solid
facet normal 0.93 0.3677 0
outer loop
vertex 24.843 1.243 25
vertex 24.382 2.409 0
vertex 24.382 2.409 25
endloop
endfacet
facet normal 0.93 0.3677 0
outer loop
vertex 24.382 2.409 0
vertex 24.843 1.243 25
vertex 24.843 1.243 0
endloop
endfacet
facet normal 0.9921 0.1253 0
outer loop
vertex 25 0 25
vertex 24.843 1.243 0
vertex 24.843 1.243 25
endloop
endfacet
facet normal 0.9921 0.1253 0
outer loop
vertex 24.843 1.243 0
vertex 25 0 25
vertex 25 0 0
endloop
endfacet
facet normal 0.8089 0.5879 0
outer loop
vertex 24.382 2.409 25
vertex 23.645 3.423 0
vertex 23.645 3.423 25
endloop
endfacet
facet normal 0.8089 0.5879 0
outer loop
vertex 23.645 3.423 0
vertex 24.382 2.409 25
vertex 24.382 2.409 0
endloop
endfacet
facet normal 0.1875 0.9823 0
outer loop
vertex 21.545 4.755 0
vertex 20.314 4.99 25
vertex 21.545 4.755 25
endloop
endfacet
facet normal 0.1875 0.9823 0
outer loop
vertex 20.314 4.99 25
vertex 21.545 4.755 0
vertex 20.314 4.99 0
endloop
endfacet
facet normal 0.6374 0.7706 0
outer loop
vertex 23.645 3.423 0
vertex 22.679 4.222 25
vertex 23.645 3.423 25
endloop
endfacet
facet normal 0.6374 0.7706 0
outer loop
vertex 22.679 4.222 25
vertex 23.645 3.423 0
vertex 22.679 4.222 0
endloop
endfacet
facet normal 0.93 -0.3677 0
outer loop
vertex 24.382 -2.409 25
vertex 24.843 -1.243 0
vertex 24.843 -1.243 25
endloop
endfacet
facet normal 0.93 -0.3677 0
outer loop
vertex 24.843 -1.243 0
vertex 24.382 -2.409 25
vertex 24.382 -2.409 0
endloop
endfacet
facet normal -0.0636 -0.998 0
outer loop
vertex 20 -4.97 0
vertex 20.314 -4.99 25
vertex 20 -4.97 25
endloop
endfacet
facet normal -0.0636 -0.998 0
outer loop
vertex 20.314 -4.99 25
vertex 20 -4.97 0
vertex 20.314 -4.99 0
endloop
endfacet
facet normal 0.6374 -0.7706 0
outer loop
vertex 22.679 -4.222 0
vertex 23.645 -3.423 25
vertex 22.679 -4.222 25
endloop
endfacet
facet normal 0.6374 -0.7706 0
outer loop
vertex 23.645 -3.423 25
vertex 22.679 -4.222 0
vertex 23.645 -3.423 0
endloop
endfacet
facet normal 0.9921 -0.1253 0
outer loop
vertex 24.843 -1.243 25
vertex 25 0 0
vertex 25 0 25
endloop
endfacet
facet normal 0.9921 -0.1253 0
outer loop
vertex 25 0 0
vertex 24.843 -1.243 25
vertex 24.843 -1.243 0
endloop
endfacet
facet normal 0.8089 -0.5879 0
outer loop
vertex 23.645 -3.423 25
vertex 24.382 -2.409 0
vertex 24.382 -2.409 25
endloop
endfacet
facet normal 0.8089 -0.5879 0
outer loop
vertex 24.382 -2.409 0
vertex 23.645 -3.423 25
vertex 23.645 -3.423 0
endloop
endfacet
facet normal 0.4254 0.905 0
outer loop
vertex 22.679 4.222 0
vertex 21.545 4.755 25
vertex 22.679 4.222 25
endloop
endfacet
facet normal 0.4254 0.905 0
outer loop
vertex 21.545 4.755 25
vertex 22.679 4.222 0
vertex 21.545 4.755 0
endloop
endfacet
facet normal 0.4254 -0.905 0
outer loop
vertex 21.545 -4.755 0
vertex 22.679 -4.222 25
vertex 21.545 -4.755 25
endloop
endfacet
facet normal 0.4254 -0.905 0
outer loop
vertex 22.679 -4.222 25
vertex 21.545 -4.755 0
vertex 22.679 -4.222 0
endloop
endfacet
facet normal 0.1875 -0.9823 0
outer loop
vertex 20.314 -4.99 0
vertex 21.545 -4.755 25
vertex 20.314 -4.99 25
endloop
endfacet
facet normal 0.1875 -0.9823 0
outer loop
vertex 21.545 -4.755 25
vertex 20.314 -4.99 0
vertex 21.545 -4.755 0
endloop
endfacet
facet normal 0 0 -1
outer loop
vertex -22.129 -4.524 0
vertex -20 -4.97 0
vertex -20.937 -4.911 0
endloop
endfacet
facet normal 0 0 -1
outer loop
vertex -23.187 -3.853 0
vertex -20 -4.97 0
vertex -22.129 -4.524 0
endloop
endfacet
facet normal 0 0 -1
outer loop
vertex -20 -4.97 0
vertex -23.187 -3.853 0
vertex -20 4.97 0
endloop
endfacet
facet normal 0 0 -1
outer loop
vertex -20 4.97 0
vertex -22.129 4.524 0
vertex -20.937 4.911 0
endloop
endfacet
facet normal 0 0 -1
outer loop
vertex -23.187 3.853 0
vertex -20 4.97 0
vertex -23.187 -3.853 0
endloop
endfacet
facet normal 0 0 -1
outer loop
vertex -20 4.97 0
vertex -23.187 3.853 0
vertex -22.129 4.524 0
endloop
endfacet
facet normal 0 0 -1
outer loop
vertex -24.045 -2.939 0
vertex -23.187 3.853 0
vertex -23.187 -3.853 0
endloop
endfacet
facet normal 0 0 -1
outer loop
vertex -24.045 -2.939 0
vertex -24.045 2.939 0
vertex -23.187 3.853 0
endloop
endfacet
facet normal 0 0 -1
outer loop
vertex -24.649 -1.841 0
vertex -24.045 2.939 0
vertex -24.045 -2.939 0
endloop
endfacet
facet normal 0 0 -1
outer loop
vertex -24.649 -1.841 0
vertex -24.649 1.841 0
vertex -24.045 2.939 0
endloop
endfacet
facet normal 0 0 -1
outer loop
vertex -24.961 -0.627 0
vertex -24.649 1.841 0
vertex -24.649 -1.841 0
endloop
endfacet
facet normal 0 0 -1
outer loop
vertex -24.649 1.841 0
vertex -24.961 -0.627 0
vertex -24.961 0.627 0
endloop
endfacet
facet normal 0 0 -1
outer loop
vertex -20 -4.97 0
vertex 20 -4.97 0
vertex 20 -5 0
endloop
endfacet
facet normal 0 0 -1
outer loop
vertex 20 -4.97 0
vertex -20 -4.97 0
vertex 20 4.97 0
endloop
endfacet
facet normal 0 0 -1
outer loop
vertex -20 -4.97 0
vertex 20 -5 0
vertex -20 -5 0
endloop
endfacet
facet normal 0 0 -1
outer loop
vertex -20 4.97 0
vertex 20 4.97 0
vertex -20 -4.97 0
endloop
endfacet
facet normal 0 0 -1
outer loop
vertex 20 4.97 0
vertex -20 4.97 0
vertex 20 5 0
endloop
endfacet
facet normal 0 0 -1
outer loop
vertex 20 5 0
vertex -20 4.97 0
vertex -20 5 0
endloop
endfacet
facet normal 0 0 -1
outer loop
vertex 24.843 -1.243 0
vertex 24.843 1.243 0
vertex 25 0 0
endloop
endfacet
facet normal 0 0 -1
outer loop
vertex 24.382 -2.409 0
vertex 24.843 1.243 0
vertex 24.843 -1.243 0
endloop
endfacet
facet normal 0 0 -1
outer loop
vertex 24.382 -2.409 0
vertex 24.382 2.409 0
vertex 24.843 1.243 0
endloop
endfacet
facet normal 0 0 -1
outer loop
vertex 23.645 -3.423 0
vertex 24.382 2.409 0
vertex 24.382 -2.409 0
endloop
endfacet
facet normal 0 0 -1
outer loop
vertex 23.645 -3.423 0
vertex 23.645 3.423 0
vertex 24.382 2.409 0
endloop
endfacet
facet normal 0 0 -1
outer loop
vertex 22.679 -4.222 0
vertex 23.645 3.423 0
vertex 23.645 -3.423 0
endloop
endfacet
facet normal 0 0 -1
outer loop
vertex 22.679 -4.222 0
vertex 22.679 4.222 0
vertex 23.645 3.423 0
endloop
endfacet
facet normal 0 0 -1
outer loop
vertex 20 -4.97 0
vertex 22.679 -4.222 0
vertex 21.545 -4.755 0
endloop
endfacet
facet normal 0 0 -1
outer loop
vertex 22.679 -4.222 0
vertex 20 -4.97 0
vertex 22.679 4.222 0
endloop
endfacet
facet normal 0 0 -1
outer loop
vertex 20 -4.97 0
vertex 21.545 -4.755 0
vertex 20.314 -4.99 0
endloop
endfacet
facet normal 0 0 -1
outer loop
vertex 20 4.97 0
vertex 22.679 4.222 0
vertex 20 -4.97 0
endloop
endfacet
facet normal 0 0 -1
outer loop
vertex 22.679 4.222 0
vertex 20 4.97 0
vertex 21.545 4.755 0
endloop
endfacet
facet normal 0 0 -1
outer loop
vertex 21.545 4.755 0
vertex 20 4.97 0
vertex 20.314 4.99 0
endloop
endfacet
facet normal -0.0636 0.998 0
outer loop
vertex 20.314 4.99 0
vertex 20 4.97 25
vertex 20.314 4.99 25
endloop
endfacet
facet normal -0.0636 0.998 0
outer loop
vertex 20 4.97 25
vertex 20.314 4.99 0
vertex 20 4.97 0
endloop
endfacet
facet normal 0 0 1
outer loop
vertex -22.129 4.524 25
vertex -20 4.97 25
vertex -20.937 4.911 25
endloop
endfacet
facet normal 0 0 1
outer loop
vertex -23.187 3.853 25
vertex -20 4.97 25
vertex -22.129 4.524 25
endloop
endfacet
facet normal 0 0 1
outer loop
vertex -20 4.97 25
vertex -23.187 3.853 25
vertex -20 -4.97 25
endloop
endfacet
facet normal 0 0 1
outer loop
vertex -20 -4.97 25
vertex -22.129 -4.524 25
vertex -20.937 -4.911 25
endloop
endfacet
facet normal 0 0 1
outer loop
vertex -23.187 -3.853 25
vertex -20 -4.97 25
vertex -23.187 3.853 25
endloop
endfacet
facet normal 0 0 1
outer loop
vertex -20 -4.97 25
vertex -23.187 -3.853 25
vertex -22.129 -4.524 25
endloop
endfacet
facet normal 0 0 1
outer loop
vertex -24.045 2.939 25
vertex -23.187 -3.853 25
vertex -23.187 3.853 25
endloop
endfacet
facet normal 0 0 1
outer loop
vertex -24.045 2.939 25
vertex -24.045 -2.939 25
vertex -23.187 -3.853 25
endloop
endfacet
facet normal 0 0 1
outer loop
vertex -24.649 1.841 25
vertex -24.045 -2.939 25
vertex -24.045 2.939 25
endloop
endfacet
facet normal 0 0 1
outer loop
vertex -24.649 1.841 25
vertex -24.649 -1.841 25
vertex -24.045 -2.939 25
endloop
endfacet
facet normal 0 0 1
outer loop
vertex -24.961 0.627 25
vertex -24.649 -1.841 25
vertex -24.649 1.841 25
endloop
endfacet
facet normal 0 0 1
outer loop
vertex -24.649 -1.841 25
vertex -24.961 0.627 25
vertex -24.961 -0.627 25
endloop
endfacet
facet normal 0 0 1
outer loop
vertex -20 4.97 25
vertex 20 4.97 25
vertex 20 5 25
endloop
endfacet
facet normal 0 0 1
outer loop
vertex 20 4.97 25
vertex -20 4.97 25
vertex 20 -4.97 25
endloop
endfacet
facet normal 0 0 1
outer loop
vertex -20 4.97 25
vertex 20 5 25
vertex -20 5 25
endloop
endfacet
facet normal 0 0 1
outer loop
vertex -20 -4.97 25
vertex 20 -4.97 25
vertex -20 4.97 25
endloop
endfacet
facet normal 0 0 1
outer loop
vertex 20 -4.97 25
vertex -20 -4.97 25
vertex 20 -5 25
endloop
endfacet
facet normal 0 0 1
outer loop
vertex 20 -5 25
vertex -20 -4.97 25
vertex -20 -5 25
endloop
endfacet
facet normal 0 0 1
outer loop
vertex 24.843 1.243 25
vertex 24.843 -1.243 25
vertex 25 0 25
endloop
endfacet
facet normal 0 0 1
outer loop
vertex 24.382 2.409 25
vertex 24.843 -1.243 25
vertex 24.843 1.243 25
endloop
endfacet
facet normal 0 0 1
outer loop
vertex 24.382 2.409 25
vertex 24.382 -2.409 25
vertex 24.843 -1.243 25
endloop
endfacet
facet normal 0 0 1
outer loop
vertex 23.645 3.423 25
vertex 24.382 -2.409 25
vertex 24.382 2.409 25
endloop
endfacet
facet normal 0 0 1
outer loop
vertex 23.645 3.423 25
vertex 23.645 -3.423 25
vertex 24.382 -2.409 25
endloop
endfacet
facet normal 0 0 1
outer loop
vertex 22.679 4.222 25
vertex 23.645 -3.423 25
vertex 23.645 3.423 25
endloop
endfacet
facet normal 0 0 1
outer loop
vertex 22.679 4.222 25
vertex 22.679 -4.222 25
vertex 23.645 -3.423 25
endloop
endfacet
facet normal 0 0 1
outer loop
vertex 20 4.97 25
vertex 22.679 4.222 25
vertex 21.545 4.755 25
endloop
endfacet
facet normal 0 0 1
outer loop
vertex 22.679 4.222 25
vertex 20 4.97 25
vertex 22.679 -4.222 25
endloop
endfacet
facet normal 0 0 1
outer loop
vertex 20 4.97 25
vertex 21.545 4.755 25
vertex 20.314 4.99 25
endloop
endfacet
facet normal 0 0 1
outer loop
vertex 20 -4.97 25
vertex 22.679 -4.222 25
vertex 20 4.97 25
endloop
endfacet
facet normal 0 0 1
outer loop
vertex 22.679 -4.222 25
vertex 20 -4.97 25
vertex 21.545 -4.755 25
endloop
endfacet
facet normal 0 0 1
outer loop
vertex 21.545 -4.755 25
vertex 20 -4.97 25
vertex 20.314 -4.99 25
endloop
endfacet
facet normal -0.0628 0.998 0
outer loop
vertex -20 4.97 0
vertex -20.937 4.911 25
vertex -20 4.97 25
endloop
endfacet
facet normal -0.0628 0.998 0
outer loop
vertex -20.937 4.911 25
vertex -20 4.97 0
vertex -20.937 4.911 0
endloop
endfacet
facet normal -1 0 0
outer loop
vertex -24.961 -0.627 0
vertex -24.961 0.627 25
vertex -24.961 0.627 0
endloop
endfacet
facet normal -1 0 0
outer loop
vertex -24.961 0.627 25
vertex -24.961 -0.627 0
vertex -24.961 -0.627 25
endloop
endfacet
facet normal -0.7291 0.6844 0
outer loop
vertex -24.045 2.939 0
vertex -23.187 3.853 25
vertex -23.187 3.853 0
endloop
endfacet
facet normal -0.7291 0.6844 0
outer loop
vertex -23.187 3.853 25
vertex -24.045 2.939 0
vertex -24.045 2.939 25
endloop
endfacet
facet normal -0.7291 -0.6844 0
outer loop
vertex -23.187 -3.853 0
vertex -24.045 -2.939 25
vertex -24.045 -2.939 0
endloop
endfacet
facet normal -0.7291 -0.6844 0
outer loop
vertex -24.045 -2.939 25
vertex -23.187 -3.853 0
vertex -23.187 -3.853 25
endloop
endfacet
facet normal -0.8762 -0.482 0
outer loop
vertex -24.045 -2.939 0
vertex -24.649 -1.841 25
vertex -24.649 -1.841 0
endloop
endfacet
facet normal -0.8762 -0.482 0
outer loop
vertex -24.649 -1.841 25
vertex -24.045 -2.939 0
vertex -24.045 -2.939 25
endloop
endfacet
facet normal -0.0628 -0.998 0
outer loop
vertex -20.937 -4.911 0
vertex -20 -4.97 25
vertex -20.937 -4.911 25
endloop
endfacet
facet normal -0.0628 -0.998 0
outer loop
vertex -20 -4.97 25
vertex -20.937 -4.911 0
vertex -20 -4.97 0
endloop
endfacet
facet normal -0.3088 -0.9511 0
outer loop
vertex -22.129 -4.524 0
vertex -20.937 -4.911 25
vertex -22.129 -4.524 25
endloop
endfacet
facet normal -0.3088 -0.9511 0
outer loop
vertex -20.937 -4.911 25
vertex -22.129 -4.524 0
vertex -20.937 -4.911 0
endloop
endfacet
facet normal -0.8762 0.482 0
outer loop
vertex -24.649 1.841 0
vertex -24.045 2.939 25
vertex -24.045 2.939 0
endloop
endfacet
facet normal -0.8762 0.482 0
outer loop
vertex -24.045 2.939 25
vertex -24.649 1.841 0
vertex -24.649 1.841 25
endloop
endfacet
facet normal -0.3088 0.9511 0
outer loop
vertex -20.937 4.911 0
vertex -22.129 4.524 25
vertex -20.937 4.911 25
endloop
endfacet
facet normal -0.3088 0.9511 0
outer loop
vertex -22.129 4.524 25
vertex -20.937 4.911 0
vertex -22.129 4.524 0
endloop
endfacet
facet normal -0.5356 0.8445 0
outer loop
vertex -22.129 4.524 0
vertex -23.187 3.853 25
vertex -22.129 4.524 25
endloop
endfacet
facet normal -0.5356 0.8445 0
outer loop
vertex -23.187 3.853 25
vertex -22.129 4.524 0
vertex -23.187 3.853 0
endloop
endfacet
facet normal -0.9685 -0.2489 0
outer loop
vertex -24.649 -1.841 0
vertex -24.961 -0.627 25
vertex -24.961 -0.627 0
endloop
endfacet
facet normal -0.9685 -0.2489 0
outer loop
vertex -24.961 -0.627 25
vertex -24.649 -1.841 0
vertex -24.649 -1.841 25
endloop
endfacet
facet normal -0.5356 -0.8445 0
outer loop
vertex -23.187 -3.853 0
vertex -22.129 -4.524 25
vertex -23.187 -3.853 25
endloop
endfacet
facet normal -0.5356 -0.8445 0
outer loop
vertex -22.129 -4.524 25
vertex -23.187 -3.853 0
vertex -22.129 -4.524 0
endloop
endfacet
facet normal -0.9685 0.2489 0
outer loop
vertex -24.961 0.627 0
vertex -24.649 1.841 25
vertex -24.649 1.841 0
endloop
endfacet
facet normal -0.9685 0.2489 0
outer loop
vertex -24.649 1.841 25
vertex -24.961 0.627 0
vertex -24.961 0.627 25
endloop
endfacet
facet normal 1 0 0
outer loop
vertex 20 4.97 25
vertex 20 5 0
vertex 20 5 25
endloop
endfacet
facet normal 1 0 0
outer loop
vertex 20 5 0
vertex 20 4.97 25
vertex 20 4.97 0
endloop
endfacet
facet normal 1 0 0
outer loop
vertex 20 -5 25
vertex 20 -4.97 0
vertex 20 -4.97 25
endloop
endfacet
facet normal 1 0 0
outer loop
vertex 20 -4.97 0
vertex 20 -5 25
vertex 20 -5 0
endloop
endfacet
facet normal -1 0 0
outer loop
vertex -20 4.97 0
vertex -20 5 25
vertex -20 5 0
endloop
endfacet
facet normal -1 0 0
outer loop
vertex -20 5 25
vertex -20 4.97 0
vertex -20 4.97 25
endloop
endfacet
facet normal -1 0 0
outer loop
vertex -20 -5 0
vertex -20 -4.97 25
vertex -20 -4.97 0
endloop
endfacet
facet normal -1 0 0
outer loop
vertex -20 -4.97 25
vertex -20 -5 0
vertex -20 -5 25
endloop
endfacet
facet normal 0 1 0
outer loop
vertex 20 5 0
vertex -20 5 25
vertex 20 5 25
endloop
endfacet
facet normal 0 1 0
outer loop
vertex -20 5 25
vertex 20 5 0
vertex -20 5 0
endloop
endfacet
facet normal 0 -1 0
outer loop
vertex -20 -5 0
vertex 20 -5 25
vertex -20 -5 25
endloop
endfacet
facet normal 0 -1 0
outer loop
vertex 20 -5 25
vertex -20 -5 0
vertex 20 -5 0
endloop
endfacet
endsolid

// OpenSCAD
$fn = 25;

diametro = 10;
ancho = 50;
altura = 25;

////////////////

union() {
    translate([(ancho - diametro)/2, 0, 0]) cylinder(altura, d=diametro);
    translate([-(ancho - diametro)/2, 0, 0]) cylinder(altura, d=diametro);
    translate([-(ancho-diametro)/2, -diametro/2, 0]) cube([ancho-diametro, diametro, altura]);
}
